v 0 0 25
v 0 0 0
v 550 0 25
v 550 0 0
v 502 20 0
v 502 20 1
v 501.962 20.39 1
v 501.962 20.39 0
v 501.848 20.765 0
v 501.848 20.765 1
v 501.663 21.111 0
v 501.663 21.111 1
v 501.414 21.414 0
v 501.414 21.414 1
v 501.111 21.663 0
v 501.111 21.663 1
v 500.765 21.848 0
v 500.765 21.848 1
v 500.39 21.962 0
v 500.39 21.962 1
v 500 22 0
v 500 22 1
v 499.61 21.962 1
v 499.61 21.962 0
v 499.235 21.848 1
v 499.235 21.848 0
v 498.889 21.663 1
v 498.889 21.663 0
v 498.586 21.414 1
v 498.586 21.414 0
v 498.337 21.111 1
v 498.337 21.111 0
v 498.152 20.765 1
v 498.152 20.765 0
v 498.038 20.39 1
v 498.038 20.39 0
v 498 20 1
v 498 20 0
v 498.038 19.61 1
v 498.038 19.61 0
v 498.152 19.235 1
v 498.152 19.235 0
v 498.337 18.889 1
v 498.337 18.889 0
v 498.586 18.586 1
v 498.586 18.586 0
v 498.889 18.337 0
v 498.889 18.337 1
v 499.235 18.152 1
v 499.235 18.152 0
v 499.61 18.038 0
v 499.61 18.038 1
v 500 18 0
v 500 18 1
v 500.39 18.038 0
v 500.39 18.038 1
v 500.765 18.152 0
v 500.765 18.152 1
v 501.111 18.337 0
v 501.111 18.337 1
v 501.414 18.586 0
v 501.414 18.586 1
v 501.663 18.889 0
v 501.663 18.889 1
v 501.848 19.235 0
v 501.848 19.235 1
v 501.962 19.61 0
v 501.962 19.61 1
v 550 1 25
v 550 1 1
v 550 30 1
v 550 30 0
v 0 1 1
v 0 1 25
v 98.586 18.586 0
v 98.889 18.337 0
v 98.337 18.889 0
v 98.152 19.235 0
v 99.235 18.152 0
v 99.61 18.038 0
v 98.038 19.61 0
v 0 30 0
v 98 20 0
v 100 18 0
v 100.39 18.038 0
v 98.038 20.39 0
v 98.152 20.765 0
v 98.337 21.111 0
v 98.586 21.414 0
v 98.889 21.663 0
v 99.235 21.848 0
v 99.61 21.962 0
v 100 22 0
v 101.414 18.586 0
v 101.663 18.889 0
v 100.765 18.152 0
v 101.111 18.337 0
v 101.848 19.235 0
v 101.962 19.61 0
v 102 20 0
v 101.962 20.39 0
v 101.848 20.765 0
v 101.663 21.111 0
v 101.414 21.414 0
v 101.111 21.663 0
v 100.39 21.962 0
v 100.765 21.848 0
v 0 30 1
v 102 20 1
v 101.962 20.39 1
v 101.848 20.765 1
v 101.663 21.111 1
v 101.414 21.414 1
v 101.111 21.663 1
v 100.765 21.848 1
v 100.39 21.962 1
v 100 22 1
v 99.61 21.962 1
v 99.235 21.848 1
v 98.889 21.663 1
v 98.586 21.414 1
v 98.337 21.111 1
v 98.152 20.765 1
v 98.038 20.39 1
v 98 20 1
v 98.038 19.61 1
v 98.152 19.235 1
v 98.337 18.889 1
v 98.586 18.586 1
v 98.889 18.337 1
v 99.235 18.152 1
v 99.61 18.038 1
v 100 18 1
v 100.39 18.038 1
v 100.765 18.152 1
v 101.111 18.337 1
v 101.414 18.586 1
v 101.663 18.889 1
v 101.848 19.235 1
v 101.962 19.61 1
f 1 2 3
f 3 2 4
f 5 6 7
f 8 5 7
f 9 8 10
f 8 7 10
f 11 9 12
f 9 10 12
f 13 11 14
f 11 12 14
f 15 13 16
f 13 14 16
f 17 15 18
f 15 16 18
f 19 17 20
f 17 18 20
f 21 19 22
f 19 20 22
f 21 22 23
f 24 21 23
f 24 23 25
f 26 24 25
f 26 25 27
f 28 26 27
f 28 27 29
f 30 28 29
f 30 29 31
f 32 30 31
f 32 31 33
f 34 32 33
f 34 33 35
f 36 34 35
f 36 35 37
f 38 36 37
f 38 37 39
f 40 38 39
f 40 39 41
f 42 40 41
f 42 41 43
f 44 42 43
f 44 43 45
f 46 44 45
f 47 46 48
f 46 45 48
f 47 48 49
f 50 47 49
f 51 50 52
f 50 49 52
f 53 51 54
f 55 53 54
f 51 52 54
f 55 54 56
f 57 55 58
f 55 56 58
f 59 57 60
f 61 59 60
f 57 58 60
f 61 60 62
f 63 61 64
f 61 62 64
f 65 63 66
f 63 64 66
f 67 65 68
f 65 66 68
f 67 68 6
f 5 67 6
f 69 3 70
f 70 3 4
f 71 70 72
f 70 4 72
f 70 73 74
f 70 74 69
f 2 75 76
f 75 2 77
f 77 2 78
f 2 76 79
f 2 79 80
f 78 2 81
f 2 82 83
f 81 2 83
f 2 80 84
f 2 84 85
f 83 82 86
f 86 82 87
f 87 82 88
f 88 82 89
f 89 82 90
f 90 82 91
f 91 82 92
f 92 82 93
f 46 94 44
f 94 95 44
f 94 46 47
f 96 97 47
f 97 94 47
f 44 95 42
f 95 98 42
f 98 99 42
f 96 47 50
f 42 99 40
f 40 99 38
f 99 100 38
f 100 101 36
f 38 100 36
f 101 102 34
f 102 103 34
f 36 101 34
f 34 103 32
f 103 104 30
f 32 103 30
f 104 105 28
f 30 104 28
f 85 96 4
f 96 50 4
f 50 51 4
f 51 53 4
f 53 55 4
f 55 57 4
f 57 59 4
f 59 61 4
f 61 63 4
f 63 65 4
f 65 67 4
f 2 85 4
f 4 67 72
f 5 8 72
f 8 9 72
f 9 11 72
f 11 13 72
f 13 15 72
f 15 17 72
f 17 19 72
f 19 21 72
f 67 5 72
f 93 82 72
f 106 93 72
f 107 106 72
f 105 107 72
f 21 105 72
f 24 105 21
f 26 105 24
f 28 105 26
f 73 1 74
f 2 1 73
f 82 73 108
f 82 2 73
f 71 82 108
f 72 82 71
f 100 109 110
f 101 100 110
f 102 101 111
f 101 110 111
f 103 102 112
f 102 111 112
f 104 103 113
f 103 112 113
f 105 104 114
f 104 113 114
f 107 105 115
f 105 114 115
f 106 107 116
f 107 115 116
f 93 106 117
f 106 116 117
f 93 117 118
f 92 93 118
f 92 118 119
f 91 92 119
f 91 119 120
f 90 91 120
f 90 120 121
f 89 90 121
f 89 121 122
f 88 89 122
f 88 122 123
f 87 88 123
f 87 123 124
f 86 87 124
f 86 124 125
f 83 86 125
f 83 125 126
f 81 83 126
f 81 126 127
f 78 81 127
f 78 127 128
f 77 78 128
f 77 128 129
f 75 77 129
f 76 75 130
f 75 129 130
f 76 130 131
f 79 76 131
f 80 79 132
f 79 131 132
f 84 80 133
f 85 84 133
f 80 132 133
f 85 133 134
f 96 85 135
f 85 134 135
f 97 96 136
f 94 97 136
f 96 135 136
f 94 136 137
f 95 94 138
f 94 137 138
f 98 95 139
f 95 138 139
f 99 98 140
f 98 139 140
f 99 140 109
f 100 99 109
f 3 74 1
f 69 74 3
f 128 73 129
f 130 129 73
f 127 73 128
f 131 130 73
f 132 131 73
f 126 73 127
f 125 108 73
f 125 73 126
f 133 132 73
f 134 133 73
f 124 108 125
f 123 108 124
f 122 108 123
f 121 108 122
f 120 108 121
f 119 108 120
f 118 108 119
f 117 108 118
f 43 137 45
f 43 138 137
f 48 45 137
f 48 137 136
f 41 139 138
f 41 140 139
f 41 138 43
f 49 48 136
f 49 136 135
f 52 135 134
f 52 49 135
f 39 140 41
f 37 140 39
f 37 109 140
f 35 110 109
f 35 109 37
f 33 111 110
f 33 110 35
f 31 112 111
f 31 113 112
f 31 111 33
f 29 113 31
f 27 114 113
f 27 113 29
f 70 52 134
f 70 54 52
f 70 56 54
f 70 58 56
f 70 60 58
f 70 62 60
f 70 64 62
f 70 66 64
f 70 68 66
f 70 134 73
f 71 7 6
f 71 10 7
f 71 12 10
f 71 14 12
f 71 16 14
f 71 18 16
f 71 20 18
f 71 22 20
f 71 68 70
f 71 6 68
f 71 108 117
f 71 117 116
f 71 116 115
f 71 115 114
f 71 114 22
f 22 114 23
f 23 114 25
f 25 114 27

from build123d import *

# Parameters (mm, degrees)
F0_W     = 550
F0_H     = 30
F1_DEPTH = 1
F2_W     = 550
F2_H     = 1
F3_DEPTH = 24
F4_R     = 2
F5_DEPTH = 1.001


with BuildPart() as f1:
    # F0 (on Top) → F1 (new body)
    with BuildSketch(Plane.XY):
        with Locations((275, 15)):
            Rectangle(F0_W, F0_H)
    extrude(amount=F1_DEPTH)

    # F2 (on face) → F3 (join)
    with BuildSketch(Plane.XY.offset(1)):
        with Locations((275, 0.5)):
            Rectangle(F2_W, F2_H)
    extrude(amount=F3_DEPTH)

    # F4 (on face) → F5 (cut, through all)
    with BuildSketch(Plane.XY.offset(1)):
        with Locations((100, 20)):
            Circle(F4_R)
        with Locations((500, 20)):
            Circle(F4_R)
    extrude(amount=-F5_DEPTH, mode=Mode.SUBTRACT)


solid = f1.part
